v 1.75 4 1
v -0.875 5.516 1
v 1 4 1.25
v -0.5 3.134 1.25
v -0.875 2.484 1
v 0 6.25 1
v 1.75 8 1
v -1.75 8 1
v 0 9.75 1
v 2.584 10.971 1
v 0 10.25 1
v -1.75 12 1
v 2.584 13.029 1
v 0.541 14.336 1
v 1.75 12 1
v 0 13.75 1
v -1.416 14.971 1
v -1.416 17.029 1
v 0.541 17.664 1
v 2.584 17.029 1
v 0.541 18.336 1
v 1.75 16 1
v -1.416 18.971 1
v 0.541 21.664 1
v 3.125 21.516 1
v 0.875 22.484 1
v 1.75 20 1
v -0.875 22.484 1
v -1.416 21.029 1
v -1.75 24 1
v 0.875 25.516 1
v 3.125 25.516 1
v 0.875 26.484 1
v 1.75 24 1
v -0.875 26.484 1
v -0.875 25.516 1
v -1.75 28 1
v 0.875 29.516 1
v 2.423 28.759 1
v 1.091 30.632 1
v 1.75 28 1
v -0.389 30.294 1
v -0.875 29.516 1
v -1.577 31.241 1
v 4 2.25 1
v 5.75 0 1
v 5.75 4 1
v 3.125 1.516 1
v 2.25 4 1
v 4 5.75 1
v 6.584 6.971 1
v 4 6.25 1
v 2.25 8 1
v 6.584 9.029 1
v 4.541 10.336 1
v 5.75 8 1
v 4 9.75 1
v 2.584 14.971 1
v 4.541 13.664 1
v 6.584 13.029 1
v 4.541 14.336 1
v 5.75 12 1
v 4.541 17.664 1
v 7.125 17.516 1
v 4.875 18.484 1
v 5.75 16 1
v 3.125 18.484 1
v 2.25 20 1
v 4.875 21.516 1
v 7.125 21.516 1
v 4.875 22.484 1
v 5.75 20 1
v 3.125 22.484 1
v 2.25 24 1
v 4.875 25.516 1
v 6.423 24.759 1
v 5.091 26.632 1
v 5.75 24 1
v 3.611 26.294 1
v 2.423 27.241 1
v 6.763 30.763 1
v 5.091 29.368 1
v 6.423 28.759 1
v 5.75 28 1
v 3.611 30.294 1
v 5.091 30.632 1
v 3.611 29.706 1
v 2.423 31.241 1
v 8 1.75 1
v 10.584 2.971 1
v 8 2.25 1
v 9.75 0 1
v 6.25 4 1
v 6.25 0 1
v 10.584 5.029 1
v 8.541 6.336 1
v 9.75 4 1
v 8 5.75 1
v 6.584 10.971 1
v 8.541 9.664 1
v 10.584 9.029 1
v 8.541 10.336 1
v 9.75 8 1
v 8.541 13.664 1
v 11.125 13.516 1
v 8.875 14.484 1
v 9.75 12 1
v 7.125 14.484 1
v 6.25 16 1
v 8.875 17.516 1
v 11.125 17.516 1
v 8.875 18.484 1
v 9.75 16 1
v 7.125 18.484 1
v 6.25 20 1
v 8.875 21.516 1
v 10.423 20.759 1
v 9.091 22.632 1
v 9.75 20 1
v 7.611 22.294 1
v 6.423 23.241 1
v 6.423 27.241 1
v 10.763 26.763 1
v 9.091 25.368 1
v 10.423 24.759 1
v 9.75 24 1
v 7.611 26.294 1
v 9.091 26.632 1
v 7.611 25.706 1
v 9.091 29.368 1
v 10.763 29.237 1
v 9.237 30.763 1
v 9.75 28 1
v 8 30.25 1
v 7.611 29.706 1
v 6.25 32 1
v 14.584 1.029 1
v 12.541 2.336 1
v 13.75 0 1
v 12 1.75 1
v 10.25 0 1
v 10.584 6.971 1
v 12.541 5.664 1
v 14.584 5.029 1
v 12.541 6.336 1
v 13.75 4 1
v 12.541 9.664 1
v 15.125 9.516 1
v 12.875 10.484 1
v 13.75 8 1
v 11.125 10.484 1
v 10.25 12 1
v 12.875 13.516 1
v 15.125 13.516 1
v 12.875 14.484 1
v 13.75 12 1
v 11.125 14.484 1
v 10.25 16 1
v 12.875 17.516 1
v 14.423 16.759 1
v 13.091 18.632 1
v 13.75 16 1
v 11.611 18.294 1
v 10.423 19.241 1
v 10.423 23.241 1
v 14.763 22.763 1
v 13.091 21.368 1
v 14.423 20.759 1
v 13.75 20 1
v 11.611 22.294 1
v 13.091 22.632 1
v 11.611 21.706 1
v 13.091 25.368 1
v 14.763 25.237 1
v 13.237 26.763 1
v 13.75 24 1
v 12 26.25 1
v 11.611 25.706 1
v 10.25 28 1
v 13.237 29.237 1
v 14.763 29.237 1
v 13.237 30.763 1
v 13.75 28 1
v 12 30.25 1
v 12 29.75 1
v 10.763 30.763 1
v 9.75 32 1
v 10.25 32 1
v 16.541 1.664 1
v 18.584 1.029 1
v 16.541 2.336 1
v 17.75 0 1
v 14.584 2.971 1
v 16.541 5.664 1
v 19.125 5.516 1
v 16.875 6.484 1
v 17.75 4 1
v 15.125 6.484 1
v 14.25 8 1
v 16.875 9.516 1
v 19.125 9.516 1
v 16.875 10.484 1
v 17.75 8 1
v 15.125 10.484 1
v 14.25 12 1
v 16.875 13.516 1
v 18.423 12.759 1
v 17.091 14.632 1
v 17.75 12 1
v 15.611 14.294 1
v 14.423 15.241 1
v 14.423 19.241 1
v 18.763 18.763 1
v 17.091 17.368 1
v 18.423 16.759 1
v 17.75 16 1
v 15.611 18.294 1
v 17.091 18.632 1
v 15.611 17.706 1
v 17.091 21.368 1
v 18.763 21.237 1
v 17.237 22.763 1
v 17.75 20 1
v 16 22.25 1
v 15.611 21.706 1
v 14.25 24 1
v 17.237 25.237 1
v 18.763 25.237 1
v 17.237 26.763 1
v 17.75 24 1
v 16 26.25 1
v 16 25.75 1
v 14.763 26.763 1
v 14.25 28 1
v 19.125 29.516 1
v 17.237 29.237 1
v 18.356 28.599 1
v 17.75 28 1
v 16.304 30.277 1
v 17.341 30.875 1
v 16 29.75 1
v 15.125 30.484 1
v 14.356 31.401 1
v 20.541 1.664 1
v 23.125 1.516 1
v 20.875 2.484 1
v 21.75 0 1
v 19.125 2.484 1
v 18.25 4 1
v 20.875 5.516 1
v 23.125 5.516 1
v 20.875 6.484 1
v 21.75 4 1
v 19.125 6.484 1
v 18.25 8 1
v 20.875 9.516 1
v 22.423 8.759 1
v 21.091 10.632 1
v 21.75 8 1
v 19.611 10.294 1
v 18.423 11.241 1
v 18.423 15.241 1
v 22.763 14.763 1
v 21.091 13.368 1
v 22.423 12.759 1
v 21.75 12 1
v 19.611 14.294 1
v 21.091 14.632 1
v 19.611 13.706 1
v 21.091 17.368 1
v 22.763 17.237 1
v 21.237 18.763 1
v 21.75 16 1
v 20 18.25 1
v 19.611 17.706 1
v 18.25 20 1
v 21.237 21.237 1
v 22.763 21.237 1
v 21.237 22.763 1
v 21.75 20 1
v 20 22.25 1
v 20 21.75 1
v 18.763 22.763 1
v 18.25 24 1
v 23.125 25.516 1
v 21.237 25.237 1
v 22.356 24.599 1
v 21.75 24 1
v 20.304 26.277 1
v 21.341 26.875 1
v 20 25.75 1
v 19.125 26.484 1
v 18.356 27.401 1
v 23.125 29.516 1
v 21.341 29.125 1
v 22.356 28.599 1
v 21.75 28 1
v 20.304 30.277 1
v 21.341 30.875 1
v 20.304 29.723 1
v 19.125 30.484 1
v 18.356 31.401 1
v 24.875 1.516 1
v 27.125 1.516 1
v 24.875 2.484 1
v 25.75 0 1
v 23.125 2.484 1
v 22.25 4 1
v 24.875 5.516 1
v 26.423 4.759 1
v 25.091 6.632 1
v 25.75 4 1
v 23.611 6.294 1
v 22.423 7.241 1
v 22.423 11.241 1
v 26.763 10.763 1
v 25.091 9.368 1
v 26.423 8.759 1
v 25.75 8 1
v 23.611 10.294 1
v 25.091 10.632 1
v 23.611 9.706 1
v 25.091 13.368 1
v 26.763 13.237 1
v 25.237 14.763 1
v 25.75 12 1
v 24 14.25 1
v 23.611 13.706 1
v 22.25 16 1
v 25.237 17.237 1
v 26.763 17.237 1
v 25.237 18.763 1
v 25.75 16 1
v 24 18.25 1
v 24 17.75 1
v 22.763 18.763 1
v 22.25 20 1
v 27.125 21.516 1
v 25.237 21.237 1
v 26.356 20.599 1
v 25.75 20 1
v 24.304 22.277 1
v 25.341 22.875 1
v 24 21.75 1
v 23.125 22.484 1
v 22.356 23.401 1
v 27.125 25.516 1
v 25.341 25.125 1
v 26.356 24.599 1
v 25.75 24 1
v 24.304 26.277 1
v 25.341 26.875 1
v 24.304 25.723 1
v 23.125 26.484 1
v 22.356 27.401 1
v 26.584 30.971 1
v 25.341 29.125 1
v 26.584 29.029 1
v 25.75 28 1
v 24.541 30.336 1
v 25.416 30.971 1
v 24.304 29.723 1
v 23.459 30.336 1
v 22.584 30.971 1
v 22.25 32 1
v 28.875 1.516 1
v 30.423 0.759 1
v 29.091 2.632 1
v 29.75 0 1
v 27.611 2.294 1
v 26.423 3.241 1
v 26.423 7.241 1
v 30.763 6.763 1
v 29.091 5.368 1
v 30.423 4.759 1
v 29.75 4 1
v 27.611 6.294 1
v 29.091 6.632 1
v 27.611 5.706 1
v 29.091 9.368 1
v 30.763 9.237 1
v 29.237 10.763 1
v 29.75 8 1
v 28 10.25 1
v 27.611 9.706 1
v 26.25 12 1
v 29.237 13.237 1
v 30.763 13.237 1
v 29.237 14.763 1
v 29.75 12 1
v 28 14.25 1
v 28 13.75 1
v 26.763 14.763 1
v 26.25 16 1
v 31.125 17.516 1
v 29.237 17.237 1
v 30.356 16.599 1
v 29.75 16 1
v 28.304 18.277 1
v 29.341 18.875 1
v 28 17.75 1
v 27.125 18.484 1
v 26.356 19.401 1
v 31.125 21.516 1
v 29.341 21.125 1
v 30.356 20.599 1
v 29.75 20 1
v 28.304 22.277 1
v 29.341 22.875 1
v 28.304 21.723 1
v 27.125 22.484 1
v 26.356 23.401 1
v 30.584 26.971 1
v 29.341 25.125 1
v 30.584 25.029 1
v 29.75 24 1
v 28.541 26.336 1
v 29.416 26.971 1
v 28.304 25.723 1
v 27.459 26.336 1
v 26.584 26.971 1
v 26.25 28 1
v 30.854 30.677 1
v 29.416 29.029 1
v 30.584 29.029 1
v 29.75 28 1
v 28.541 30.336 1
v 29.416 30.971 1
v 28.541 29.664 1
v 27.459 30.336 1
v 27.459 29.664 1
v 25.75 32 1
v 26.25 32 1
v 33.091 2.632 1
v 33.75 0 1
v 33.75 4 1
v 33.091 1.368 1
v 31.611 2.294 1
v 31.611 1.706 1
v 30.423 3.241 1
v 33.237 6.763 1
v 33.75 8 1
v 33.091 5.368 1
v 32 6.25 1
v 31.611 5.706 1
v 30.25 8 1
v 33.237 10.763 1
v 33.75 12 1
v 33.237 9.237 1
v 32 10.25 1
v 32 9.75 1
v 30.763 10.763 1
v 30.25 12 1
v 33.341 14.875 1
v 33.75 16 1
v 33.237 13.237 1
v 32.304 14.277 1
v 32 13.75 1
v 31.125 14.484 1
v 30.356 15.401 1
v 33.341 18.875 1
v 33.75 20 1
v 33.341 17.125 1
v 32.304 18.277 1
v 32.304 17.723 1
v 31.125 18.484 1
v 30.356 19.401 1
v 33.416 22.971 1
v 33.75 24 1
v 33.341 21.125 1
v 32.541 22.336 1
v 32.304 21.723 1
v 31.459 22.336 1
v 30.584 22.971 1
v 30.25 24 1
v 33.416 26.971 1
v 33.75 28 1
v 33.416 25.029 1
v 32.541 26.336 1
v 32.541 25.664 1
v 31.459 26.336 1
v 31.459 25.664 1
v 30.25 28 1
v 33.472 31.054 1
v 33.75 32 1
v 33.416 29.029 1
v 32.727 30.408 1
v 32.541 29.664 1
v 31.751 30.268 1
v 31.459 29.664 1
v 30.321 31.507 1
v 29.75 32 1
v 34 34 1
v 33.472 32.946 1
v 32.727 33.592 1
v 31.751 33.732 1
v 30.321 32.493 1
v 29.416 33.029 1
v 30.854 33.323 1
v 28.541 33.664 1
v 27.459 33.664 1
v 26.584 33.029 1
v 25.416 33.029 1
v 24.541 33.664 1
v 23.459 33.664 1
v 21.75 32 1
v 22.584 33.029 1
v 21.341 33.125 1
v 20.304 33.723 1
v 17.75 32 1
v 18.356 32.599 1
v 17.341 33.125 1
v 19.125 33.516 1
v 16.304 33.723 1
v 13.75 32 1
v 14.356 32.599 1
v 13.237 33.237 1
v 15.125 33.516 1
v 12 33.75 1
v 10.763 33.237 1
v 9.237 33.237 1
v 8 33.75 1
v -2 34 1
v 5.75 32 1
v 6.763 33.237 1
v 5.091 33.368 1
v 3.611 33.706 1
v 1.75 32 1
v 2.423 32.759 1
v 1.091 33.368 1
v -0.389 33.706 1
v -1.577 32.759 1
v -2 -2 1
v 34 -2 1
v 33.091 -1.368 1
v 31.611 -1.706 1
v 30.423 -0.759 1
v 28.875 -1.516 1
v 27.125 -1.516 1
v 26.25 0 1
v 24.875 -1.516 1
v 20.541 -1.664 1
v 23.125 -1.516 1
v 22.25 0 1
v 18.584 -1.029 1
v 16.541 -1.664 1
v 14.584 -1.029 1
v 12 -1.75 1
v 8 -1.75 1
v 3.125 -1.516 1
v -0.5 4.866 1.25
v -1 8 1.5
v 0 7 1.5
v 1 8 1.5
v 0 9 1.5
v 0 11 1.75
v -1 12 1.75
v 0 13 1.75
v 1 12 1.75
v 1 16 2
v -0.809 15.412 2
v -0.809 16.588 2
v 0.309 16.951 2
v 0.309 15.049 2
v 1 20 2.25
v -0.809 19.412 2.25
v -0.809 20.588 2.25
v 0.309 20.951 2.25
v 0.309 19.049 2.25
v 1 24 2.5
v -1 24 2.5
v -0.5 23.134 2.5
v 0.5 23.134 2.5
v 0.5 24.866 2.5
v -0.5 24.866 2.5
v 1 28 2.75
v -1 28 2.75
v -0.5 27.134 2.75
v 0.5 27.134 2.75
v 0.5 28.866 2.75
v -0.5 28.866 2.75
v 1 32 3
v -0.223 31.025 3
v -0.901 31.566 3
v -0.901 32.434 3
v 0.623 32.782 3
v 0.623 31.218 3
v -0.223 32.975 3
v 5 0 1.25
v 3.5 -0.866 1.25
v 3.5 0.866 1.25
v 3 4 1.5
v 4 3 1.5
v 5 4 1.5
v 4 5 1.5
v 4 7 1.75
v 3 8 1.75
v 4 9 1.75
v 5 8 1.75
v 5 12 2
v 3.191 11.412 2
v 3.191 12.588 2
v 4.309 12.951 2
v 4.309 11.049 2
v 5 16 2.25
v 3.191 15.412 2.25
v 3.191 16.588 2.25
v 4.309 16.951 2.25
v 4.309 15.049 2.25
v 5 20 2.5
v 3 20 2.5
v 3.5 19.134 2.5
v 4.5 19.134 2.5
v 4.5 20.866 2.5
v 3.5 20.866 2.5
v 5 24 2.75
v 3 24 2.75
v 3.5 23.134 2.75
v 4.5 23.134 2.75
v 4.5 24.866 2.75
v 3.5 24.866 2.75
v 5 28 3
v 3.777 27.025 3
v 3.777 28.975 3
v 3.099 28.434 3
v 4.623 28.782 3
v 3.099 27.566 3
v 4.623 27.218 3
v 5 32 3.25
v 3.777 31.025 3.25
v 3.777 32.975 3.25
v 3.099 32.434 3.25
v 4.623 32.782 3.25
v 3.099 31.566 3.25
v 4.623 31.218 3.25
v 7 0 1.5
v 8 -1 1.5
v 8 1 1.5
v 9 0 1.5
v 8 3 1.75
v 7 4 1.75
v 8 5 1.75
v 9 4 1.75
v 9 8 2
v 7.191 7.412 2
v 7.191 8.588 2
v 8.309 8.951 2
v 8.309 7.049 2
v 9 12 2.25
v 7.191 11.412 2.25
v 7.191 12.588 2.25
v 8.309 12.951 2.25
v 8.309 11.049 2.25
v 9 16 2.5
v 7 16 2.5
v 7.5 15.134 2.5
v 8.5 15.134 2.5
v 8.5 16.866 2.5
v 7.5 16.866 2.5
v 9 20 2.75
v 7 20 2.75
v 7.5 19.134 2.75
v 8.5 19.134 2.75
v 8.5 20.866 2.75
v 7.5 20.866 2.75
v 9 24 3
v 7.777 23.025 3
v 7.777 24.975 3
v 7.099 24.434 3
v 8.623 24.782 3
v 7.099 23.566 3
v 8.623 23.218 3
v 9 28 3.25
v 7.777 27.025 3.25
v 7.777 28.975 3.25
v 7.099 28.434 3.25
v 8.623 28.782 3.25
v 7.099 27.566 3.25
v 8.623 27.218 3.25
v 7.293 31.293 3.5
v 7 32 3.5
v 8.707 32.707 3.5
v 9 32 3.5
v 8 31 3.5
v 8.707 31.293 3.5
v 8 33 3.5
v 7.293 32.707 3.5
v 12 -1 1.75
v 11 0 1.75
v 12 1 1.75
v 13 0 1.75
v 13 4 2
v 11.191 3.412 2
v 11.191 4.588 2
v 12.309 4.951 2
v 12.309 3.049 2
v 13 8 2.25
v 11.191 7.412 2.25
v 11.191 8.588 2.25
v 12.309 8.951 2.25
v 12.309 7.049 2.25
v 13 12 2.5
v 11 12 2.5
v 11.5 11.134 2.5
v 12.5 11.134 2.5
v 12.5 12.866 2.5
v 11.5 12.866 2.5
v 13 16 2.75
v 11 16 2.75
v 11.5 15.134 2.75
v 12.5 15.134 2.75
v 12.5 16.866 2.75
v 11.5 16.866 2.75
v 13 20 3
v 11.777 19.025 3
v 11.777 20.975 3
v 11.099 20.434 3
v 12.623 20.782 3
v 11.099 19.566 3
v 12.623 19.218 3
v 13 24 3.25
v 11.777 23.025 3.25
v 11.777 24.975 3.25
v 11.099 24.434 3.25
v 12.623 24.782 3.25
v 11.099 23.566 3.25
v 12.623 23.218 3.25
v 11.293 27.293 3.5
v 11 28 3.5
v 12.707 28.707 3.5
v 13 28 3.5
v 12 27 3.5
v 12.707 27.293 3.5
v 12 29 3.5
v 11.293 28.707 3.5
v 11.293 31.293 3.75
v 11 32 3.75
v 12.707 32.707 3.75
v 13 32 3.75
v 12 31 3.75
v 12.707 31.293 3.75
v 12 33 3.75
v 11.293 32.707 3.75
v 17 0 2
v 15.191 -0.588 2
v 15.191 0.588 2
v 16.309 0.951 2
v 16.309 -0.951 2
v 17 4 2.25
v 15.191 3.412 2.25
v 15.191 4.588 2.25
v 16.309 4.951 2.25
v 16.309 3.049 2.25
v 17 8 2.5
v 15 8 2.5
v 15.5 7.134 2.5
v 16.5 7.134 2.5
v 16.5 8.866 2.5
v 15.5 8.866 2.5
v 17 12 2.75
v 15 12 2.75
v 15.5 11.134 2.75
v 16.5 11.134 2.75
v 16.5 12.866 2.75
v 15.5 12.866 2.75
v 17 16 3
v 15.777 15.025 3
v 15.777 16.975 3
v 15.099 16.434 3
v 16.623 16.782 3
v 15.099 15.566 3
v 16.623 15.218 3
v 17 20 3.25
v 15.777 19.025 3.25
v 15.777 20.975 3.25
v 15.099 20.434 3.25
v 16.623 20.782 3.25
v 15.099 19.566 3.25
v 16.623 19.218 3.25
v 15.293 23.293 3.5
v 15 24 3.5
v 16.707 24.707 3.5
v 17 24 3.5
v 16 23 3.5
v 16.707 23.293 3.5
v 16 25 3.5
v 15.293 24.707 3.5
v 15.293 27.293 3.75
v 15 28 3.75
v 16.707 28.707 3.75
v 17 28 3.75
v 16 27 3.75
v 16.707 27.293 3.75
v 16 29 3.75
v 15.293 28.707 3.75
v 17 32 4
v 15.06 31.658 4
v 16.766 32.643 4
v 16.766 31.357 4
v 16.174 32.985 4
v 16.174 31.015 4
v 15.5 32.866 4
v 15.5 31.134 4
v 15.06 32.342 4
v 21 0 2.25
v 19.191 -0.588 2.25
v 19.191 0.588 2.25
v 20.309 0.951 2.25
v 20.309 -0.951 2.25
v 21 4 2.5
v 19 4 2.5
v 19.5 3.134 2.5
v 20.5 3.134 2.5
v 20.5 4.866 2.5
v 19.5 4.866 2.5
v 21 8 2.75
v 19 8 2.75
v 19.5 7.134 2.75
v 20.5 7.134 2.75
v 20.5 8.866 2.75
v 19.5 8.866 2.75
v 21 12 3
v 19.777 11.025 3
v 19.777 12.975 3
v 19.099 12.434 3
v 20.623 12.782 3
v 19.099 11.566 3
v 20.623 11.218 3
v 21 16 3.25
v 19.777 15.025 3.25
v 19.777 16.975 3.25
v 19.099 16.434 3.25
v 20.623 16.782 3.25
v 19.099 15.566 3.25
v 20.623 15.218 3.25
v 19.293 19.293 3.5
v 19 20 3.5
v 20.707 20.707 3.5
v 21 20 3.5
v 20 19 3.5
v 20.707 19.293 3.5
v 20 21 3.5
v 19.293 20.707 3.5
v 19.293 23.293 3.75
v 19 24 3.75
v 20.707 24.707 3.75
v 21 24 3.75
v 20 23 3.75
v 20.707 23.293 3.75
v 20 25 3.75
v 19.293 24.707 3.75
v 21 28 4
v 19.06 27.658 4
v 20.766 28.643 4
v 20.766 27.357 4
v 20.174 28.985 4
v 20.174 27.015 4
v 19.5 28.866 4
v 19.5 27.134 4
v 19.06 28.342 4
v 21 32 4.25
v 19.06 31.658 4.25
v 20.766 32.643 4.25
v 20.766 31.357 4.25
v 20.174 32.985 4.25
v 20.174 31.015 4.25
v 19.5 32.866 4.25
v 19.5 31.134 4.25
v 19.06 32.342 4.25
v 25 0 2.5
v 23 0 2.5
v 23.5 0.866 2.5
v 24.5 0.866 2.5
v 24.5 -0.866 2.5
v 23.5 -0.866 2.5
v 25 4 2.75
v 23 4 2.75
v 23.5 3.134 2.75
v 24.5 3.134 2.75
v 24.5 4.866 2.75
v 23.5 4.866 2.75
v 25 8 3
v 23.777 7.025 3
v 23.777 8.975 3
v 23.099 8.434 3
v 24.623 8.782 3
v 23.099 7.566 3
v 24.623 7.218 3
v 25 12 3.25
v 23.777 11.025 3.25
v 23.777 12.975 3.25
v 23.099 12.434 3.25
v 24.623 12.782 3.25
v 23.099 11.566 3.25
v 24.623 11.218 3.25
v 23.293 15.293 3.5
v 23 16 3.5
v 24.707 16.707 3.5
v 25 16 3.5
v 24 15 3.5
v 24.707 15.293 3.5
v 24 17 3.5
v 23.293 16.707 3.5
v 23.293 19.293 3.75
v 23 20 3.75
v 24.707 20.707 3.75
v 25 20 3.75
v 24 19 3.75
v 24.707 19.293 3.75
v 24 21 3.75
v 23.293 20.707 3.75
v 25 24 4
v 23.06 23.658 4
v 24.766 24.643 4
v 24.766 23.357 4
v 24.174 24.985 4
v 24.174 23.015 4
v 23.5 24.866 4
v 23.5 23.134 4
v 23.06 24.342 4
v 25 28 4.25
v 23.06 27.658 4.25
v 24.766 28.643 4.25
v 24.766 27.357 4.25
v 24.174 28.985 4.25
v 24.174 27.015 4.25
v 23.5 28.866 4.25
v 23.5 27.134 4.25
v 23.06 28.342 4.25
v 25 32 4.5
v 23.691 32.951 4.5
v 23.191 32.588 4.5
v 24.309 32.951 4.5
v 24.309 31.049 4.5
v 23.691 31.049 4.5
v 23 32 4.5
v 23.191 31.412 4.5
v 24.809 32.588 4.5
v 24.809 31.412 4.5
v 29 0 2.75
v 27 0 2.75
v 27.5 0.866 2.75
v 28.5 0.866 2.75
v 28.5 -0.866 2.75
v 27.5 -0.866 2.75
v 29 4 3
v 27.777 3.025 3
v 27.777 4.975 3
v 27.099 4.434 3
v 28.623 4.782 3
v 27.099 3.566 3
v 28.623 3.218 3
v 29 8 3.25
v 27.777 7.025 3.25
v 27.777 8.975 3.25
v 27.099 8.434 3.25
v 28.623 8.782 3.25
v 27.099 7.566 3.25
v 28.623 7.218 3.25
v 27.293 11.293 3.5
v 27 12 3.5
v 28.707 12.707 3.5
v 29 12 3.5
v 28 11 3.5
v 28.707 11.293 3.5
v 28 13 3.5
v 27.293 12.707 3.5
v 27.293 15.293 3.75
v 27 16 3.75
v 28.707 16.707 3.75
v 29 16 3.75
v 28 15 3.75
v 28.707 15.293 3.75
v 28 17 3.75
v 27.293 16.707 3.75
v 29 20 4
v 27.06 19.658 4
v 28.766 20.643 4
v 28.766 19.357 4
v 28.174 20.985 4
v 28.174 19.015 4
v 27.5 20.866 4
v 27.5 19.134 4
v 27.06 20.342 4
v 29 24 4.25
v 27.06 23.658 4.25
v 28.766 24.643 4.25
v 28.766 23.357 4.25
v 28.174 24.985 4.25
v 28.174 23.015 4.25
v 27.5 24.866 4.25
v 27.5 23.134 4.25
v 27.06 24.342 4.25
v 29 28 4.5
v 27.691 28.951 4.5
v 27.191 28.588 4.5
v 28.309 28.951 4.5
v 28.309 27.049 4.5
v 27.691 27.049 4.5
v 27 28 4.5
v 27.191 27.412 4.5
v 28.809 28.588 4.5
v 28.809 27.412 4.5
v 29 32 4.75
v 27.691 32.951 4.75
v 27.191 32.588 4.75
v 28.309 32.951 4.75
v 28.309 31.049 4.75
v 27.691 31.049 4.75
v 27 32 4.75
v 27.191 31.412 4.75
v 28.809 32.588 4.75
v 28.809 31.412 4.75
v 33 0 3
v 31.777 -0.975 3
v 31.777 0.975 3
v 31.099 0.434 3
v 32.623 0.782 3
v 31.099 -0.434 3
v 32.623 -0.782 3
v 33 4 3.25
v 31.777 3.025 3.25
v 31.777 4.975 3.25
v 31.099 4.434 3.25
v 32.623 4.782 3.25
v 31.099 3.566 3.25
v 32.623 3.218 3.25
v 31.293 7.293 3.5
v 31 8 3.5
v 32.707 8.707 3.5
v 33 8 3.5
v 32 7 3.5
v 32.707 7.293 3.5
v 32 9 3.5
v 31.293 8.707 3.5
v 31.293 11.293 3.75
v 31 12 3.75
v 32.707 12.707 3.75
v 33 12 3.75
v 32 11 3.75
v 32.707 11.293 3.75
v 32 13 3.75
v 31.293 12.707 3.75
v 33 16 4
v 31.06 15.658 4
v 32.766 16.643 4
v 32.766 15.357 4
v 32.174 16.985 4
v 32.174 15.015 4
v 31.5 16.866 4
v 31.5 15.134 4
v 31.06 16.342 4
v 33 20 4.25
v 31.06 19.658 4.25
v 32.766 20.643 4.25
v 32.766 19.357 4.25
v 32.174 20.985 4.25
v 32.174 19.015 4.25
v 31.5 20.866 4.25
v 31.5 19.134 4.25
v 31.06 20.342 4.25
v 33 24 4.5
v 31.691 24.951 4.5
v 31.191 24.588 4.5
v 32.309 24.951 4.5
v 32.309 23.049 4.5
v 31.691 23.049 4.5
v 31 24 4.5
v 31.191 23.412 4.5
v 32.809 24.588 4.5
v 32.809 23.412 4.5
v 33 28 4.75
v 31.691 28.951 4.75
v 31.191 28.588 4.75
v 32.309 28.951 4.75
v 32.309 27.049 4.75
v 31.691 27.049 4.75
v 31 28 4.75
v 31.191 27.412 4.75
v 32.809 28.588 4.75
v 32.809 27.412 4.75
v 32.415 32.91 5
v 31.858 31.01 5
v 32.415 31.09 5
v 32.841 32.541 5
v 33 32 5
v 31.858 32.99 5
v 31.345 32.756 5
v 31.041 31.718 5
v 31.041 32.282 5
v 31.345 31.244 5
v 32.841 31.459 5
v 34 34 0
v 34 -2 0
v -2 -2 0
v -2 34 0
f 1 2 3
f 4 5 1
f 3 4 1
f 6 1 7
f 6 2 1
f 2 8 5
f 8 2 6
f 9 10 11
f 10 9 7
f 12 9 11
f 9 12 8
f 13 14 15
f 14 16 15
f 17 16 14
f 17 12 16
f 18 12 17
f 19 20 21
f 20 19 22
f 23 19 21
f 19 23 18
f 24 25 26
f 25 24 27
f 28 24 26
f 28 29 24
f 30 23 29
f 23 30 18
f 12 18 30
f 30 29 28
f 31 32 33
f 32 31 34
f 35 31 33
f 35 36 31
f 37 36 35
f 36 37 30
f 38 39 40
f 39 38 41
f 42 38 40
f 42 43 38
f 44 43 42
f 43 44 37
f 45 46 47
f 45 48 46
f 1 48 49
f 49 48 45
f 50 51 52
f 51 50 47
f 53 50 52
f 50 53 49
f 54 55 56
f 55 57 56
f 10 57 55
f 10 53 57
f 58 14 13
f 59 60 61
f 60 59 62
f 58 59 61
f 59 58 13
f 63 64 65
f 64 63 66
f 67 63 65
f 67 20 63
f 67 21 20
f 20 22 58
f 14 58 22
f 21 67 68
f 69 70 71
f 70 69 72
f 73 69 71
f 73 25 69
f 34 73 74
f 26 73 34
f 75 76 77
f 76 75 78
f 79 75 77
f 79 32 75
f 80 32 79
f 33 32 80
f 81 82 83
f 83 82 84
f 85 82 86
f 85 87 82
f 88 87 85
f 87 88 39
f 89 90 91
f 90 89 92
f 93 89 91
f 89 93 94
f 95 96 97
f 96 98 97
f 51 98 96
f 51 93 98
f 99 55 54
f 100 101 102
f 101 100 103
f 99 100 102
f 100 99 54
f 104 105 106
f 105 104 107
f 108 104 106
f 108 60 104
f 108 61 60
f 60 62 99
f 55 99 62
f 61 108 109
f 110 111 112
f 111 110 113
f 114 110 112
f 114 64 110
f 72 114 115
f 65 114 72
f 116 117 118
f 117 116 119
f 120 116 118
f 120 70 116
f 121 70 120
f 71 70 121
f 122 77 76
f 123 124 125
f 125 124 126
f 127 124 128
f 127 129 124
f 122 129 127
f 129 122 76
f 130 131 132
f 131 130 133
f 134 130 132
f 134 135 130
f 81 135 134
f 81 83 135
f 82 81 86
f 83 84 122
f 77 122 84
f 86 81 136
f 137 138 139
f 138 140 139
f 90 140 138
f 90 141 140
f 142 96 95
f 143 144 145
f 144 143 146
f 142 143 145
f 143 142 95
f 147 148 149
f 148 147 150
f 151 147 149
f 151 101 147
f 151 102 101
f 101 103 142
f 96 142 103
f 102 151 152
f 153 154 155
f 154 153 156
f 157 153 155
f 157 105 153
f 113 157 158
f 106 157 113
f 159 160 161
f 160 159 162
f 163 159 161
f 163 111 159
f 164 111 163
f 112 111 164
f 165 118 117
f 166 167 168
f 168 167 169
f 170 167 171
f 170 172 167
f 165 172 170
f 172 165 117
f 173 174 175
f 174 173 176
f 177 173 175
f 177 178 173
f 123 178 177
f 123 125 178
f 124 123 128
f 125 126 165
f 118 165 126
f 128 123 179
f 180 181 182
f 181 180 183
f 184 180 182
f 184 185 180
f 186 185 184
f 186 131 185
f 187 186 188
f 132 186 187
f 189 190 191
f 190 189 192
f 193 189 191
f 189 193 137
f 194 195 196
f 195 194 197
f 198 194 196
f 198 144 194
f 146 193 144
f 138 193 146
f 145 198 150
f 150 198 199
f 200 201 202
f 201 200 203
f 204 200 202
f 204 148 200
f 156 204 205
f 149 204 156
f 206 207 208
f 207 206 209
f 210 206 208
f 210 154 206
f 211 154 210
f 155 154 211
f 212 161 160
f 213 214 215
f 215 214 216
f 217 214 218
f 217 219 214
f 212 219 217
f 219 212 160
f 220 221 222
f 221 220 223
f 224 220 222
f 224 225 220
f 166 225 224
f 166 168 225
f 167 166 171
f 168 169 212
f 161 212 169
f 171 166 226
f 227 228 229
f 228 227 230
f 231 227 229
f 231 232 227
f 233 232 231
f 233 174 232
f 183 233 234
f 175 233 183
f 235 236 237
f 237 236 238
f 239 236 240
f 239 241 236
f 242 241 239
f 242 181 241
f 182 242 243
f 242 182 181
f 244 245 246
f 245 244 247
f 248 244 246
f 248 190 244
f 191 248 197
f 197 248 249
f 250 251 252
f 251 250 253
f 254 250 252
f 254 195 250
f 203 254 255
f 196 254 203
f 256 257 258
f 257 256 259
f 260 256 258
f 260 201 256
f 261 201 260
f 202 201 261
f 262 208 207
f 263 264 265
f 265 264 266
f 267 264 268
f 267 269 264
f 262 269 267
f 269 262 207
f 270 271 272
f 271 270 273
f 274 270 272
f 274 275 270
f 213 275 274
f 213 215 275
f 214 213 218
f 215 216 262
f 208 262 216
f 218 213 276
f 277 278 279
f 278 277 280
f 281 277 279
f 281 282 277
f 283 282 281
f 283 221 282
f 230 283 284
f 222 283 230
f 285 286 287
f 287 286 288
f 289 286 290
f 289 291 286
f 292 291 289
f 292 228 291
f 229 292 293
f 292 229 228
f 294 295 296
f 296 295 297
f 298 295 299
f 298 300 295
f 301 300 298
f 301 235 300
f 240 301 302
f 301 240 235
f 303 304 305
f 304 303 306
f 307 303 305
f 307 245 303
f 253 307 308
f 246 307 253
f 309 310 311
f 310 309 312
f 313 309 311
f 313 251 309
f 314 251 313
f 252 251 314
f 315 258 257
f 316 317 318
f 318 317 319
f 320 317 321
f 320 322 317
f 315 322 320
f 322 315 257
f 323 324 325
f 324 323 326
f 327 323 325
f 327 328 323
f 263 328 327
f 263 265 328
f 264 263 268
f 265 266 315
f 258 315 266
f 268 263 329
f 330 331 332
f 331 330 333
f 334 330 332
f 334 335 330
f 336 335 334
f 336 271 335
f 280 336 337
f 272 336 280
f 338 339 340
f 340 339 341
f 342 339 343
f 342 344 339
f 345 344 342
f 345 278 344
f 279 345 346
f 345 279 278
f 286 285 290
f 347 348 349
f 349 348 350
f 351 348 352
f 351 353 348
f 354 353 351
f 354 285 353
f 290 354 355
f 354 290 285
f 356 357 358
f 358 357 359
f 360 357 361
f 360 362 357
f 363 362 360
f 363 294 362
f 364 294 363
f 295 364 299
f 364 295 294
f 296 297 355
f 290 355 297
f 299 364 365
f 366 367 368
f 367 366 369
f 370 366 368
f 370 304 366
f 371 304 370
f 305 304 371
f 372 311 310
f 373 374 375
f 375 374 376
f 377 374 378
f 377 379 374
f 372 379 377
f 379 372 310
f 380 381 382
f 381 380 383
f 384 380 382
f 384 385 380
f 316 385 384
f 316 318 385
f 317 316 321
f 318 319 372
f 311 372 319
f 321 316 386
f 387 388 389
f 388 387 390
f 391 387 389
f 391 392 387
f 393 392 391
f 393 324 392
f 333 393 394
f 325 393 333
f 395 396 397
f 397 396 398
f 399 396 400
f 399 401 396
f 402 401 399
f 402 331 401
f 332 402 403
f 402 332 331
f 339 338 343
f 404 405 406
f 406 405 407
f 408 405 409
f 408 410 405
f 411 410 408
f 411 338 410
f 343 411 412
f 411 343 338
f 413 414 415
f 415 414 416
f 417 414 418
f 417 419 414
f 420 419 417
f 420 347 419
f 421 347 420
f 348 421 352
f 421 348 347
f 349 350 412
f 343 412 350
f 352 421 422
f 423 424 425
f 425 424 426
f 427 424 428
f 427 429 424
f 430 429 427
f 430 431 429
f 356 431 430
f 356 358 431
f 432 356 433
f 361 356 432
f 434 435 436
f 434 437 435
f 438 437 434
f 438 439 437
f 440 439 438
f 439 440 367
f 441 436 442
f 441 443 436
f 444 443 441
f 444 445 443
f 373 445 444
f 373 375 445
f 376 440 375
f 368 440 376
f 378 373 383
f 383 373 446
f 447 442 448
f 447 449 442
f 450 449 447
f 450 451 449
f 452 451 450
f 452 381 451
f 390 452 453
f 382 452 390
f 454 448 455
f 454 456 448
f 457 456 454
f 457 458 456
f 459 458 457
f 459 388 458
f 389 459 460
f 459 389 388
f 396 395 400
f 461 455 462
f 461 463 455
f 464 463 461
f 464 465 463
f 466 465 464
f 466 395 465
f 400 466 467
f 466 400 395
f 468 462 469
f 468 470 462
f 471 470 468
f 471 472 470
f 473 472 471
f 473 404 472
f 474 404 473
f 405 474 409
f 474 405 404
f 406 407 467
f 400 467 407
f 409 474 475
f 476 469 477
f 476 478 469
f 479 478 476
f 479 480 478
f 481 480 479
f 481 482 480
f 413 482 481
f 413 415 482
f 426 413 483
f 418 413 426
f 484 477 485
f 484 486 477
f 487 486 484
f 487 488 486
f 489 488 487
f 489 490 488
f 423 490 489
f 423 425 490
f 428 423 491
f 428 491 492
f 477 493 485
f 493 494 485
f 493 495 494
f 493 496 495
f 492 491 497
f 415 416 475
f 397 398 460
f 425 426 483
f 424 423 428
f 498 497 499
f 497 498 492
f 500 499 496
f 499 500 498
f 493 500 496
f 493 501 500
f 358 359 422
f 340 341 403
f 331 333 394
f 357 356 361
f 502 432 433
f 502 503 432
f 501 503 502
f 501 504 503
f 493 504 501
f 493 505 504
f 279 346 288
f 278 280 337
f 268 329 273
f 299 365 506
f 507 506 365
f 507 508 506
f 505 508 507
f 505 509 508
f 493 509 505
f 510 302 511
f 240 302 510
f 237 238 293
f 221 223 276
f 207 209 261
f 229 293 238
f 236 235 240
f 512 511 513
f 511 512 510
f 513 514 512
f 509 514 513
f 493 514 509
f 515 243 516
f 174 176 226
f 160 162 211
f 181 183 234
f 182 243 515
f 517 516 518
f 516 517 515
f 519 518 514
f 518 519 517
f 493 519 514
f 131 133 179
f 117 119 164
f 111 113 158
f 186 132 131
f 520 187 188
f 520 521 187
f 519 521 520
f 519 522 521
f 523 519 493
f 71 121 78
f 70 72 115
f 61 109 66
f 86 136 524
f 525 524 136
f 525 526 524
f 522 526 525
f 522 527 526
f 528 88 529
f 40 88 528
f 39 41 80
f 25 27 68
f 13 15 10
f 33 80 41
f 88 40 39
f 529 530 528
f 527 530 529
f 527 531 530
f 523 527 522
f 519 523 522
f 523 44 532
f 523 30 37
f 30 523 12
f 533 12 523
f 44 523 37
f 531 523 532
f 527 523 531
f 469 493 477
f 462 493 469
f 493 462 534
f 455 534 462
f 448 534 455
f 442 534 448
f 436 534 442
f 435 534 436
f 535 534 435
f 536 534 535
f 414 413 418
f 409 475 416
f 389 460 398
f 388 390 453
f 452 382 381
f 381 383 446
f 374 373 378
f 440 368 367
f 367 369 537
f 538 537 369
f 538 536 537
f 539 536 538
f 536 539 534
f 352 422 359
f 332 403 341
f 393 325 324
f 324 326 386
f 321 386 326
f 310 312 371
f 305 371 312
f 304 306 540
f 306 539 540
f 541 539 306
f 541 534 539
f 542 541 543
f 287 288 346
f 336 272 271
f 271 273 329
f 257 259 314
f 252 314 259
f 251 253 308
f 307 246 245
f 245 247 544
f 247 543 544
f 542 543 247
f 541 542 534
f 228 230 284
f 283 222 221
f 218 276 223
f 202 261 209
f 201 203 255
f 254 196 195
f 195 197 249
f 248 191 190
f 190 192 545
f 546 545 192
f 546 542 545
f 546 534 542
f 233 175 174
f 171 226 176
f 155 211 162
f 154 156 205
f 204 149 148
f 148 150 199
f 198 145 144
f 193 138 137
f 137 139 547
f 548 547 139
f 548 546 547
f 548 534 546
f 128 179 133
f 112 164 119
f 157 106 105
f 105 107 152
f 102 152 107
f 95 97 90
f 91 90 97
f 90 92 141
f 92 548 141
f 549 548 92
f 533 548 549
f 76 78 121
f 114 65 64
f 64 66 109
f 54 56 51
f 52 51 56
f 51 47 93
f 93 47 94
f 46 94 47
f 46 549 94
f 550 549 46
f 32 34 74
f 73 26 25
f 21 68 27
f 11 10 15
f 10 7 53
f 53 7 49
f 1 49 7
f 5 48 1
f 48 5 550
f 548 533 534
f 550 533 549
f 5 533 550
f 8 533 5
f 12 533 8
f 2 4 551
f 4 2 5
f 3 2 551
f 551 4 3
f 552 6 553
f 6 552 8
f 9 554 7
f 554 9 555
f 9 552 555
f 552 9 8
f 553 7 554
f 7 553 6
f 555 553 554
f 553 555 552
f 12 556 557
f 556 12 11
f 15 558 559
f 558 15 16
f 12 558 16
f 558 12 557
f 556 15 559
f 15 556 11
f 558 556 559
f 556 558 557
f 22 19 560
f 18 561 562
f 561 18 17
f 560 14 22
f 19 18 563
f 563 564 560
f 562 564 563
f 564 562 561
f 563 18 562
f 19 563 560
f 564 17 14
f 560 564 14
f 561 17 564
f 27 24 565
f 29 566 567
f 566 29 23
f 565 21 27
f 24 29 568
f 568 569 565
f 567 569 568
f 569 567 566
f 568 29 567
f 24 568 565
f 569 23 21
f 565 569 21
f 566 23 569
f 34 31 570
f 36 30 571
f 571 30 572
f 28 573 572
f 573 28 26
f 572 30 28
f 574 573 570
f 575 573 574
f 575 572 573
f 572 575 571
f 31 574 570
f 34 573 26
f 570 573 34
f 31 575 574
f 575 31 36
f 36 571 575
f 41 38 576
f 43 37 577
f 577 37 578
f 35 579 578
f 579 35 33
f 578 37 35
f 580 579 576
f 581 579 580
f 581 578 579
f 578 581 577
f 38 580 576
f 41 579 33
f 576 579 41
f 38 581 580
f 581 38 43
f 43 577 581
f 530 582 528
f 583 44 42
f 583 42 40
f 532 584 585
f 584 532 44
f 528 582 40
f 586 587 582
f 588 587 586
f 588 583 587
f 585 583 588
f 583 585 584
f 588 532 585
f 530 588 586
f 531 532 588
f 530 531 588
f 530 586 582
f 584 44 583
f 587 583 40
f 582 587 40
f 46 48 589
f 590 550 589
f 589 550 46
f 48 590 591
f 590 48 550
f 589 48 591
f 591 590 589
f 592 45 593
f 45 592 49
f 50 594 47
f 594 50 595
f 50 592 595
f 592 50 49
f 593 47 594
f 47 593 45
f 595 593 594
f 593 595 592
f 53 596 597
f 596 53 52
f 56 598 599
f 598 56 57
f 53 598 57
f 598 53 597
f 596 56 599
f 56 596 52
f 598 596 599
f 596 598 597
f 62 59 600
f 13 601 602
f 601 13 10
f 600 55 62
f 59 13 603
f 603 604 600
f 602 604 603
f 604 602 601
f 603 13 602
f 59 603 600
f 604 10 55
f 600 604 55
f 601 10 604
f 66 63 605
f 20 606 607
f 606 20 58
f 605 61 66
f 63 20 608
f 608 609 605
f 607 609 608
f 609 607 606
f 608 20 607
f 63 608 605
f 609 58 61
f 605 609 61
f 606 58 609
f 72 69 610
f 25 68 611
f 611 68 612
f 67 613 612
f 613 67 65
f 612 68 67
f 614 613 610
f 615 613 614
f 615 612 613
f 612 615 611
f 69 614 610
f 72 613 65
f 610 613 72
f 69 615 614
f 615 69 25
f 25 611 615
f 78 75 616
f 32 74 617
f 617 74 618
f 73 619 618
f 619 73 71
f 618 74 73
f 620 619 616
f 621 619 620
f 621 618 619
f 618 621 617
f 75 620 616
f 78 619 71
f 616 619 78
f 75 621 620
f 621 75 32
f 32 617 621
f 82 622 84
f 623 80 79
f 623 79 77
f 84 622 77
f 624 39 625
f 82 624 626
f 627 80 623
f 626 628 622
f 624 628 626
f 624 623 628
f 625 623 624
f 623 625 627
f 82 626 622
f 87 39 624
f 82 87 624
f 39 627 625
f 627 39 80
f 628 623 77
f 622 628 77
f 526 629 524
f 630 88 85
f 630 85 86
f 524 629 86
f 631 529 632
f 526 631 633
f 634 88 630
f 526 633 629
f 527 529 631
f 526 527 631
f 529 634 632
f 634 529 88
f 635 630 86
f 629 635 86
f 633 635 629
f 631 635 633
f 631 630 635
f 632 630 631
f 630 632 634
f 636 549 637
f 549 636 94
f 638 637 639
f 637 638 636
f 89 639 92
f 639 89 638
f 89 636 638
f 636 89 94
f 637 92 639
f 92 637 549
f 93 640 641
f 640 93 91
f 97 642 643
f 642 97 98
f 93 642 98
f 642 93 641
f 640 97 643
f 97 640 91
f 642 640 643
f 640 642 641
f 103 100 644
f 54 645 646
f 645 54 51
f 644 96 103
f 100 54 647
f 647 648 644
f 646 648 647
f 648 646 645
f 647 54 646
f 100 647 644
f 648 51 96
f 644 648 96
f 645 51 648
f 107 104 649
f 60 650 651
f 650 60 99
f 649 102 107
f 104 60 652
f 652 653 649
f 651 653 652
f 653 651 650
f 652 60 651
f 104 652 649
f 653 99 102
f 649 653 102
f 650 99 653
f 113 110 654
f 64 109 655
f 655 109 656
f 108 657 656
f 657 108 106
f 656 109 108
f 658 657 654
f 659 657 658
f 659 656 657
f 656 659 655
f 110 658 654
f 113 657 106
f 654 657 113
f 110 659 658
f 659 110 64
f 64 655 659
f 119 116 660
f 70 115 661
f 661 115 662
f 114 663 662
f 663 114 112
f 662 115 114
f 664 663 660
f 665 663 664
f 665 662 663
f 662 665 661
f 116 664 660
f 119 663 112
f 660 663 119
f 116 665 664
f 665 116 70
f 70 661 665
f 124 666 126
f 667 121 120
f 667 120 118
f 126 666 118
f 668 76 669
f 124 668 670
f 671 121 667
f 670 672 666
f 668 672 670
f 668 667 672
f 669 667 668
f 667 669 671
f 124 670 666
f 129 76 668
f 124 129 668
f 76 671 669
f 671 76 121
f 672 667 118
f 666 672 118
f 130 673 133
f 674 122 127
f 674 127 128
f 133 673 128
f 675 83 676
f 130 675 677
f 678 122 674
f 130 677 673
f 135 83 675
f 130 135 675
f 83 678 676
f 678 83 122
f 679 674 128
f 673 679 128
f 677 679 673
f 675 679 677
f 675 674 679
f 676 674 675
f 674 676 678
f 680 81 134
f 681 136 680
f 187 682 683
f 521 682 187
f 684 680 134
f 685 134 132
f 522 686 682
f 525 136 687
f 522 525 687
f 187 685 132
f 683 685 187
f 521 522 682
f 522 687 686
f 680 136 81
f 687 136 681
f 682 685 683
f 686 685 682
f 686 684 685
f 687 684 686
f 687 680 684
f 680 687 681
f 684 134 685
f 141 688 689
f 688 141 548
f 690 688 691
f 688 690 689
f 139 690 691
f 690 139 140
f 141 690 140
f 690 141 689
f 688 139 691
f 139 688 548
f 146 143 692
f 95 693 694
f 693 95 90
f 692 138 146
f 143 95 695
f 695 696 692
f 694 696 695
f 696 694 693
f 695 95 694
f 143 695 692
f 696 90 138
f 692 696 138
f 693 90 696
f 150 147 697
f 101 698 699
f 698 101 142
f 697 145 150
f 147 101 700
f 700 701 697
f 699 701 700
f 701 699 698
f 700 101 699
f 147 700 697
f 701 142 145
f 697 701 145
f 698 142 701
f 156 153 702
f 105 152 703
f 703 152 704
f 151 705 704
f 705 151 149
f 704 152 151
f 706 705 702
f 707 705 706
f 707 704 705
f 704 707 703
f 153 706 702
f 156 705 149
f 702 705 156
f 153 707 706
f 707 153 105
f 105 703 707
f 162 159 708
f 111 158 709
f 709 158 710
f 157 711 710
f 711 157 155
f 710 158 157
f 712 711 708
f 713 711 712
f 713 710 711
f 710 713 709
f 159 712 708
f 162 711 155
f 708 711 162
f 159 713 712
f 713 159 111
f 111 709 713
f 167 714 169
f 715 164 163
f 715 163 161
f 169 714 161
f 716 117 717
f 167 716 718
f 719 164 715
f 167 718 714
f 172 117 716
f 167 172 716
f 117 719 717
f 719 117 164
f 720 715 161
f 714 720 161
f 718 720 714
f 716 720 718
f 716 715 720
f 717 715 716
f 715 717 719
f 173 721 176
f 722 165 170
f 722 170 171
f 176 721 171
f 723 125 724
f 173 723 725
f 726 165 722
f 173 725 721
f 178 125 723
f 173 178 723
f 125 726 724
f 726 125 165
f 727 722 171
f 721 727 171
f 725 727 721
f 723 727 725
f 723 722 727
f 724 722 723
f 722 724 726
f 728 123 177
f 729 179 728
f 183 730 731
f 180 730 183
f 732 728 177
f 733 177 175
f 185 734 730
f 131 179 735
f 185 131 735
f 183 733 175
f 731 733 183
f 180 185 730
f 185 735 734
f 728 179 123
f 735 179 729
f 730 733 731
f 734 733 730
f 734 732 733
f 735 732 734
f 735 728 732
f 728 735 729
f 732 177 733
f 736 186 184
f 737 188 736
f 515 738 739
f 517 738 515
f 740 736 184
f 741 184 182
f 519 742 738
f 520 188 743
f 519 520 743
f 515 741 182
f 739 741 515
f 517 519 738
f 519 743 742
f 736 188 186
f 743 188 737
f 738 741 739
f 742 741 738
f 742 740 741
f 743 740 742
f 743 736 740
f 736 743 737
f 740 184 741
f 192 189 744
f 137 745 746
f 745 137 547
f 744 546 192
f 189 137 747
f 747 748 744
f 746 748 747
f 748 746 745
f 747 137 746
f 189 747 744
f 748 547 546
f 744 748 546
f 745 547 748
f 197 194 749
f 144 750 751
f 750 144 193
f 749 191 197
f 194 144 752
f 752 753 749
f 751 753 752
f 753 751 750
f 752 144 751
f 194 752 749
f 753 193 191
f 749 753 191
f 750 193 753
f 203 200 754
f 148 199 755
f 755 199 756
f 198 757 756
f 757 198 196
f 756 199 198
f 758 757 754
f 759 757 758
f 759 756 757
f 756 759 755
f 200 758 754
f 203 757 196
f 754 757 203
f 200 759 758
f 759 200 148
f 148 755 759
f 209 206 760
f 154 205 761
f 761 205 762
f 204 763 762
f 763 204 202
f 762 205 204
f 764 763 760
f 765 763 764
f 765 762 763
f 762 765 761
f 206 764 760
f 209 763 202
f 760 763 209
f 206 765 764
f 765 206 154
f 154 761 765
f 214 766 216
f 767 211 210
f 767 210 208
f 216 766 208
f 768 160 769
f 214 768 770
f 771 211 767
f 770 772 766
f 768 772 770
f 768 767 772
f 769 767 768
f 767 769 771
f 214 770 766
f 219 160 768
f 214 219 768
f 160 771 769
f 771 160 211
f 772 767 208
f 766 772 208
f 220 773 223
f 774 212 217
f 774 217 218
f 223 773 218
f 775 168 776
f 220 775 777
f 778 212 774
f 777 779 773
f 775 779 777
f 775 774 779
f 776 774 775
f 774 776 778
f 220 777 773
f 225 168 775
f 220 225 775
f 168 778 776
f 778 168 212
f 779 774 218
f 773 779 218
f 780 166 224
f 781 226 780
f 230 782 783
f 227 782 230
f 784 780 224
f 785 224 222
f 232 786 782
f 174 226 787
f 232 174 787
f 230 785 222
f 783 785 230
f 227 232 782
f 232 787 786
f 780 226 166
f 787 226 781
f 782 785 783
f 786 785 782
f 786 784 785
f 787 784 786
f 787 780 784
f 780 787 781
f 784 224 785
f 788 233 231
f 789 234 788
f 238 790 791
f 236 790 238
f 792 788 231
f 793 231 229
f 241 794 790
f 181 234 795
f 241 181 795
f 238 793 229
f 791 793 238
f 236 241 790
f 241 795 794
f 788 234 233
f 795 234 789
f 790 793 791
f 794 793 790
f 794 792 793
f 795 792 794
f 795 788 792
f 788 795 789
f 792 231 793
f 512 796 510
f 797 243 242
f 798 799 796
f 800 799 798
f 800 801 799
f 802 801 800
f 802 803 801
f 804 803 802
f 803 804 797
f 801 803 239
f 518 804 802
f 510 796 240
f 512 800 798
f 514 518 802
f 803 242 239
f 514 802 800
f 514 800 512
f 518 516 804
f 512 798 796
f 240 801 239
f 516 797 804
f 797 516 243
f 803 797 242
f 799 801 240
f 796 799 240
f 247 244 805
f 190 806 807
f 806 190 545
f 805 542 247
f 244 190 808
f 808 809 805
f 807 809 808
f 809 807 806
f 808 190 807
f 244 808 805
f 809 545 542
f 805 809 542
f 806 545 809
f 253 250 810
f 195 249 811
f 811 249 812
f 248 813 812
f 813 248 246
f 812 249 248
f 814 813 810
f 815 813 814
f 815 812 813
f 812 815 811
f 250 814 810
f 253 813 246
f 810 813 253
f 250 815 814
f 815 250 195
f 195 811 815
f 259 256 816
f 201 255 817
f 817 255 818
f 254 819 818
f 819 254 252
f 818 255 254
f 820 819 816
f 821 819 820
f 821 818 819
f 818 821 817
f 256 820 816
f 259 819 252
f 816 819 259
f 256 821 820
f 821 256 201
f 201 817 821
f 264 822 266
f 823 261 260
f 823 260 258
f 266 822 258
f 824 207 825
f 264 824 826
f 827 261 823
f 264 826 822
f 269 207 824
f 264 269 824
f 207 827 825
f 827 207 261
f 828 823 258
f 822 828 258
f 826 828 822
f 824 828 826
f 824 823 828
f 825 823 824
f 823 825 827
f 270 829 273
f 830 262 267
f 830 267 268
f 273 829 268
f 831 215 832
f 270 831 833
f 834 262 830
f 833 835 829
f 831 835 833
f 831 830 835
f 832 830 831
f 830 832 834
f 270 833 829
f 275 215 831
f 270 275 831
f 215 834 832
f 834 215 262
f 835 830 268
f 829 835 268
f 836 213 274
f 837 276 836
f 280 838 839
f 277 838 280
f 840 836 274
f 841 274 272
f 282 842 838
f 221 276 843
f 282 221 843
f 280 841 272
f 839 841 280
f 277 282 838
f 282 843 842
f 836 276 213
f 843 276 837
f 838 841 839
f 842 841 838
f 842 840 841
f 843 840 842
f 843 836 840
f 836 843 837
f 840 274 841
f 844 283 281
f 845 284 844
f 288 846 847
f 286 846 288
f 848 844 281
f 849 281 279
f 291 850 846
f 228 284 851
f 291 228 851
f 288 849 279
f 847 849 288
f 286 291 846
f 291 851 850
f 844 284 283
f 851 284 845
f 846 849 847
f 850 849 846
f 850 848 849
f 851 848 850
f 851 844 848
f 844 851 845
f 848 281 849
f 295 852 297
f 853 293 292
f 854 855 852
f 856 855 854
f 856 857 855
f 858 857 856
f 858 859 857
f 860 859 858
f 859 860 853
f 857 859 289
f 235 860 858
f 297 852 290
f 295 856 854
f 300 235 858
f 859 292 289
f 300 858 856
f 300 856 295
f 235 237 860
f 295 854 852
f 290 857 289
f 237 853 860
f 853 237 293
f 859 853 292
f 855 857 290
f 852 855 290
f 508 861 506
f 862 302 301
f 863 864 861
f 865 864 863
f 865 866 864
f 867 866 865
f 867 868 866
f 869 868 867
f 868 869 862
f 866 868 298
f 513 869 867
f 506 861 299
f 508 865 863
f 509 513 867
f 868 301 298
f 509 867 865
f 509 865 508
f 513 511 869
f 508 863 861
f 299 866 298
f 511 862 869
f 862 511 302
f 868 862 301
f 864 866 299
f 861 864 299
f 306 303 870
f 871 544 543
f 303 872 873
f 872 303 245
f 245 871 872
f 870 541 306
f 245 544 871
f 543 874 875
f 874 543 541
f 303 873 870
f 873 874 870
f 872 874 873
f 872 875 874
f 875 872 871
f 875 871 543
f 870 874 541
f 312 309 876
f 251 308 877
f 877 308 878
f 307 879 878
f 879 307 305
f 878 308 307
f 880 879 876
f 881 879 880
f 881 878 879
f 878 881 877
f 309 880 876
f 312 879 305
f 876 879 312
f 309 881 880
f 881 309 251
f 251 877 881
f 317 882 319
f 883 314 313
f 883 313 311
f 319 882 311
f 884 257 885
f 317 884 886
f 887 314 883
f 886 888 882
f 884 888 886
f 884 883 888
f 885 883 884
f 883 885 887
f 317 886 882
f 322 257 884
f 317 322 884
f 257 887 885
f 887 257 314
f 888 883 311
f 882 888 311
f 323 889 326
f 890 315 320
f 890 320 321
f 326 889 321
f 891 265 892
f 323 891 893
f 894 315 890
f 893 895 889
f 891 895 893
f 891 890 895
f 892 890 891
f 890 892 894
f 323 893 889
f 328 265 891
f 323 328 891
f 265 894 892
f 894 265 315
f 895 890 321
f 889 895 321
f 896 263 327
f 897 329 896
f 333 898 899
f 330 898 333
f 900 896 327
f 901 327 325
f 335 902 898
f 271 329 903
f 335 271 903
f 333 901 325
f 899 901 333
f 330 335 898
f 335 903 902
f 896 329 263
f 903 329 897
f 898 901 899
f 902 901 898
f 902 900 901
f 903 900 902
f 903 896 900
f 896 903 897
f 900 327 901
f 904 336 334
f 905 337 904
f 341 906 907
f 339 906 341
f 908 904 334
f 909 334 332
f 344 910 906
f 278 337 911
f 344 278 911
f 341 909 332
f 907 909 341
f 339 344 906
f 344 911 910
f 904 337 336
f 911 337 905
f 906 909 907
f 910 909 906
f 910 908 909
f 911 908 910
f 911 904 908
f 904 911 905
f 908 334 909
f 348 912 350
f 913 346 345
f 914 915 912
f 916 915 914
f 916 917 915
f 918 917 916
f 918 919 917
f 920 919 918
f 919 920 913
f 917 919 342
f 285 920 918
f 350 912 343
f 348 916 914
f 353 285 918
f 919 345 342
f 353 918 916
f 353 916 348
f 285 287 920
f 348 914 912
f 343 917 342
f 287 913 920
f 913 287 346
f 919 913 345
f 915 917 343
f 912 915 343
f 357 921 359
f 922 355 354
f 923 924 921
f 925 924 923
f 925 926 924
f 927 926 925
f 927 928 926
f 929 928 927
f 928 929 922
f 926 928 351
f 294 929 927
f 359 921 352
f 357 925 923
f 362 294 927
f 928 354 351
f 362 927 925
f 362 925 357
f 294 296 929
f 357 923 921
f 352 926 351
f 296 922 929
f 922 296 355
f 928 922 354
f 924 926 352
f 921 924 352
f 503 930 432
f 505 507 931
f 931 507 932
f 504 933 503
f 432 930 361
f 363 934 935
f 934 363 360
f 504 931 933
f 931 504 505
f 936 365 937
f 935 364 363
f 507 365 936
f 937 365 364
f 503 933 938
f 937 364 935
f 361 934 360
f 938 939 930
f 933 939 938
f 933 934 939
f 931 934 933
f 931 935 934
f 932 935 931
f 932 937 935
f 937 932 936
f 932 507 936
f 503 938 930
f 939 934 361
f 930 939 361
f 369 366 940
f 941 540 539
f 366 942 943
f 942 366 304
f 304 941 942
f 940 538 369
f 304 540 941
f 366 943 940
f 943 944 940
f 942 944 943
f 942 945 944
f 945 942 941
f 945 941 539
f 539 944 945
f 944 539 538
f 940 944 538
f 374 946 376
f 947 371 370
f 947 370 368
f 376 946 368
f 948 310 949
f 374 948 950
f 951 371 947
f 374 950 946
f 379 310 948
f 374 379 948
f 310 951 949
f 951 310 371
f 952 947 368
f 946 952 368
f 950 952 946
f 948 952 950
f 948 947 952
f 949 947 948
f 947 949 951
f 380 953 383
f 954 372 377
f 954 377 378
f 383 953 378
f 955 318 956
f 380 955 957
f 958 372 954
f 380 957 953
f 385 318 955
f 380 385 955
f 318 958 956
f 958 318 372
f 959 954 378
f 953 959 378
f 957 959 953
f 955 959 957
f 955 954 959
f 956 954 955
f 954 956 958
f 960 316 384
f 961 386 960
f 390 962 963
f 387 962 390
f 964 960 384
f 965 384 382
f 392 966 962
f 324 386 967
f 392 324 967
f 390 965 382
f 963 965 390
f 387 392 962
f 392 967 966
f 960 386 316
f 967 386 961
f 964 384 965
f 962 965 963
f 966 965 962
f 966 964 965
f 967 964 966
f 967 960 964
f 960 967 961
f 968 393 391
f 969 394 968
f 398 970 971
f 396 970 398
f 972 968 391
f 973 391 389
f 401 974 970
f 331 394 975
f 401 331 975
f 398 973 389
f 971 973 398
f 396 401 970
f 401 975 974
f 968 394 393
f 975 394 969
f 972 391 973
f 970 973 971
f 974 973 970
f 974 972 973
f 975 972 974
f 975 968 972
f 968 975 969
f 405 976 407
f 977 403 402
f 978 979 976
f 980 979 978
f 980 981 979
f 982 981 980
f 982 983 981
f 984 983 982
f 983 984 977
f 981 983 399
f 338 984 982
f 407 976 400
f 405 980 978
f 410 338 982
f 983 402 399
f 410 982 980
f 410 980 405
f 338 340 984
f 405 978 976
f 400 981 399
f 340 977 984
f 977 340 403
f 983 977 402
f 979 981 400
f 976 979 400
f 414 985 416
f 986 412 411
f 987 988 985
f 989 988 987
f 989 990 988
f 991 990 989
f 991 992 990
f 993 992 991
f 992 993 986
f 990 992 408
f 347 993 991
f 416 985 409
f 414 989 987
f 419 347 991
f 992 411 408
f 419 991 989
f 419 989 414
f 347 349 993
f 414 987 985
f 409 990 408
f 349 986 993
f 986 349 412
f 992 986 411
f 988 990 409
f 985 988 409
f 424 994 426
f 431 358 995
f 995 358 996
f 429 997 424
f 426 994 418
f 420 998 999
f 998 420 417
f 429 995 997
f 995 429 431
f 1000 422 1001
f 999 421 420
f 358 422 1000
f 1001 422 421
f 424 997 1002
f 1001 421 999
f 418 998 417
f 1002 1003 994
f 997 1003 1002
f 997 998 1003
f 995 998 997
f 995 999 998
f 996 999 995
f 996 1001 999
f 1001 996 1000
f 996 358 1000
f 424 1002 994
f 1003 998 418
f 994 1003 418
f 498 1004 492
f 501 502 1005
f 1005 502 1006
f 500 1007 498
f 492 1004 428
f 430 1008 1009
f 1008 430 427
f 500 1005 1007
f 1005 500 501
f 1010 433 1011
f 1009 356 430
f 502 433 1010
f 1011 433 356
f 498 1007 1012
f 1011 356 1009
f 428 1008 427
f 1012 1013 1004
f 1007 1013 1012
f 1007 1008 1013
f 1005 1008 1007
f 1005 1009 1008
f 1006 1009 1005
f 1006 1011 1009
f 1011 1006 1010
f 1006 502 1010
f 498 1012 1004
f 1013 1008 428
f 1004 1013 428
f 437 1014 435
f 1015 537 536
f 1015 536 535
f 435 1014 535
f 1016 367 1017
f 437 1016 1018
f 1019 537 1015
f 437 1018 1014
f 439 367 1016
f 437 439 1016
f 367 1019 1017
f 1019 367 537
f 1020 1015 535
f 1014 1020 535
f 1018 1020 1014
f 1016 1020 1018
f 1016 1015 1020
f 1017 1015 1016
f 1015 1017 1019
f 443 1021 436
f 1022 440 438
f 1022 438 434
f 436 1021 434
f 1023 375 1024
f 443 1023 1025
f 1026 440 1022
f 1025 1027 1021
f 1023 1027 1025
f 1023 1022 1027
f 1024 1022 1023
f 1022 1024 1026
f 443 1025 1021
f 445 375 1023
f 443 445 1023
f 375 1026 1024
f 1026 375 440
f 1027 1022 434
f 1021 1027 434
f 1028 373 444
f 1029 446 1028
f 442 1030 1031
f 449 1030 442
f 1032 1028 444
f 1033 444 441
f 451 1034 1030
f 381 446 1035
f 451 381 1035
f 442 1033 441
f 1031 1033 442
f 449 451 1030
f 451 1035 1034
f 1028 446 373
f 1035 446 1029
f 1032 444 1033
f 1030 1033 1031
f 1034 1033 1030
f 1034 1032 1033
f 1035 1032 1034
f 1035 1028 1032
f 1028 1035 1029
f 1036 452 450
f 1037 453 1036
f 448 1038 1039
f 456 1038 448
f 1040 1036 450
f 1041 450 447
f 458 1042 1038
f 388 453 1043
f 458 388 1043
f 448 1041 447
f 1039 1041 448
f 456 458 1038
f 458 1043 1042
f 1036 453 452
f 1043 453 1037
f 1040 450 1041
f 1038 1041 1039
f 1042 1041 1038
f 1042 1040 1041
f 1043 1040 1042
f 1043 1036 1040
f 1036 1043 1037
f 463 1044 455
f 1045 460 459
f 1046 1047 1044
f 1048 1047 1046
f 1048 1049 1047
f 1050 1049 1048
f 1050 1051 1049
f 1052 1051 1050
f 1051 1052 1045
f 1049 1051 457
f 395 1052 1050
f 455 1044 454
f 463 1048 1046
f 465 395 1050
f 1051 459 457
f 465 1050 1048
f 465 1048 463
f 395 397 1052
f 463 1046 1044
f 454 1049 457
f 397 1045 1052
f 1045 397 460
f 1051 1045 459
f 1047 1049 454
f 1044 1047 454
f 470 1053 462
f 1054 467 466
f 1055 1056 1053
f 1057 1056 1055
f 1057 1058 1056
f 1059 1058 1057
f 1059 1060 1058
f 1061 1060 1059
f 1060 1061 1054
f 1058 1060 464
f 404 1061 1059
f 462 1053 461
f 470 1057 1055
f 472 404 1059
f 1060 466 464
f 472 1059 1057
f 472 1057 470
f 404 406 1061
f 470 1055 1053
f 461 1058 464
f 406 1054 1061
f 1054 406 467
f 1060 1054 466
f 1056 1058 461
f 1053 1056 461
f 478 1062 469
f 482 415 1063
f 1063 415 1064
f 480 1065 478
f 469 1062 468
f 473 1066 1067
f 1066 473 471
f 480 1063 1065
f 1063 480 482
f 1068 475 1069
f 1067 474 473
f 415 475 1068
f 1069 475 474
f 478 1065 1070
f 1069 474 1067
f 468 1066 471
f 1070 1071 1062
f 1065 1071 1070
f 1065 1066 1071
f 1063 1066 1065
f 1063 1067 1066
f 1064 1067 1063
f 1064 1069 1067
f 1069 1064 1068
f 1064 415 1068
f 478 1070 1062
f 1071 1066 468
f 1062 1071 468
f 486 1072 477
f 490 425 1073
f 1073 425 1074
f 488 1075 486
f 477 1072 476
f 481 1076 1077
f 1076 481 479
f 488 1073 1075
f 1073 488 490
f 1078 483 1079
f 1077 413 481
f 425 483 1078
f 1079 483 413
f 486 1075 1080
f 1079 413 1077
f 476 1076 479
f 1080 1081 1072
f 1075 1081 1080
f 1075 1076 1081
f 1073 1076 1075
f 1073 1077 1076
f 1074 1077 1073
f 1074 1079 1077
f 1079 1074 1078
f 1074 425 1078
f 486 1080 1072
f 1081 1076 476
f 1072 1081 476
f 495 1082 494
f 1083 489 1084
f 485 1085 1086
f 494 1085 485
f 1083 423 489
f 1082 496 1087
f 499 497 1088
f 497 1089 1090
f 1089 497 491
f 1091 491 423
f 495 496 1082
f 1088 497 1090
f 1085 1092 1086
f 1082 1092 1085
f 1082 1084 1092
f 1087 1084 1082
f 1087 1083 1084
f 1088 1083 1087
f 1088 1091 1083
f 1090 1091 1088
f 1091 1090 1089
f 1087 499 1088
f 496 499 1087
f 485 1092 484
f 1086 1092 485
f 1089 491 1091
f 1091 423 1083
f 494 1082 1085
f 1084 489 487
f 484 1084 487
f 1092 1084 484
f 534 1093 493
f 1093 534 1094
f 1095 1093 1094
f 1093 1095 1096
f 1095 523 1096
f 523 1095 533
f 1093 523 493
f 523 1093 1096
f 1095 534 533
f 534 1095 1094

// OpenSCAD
// [FL_INDEX: keywords="openscad, 3d_parametric, PixSCAD_Proof-Of-Concept, csg_solid" | COT="Parametric OpenSCAD design from 3DCodeverse"]
// Title: PixSCAD Proof-Of-Concept

//Makerbot Hackathon 2013
//PixSCAD
//Proof Of Concept for a picture to OpenSCAD Customizable Thingi
//Team - Alex Tanchoco (LionAlex)
//	Cameron Stern (SternDesignworks)
//	Allister McKenzie (Dion)


grid_height = 8;
grid_width = 8;

grid_overall_diameter = 4;
grid_lower_diameter = 3.5;
grid_upper_diameter = 2; // 
grid_maximum_height = 5; //

grid_polygons = 3;

grid_base_height = 1;

translate( [-grid_overall_diameter/2, -grid_overall_diameter/2,0] )
	cube( [grid_overall_diameter*(grid_width+1), grid_overall_diameter*(grid_height+1),grid_base_height] );

for ( x=[0:1:grid_height] ) {
	for( y=[0:1:grid_width] ) {
		translate( [x*grid_overall_diameter,y*grid_overall_diameter,grid_base_height] )
			cylinder( h=(x+y)/4, r1=grid_lower_diameter/2, r2=grid_upper_diameter/2, $fn=grid_polygons+x/2+y/2 );
			//cylinder( h=(x+y)/4, r=grid_lower_diameter/2, $fn=grid_polygons+x/2+y/2 );
	}
}
